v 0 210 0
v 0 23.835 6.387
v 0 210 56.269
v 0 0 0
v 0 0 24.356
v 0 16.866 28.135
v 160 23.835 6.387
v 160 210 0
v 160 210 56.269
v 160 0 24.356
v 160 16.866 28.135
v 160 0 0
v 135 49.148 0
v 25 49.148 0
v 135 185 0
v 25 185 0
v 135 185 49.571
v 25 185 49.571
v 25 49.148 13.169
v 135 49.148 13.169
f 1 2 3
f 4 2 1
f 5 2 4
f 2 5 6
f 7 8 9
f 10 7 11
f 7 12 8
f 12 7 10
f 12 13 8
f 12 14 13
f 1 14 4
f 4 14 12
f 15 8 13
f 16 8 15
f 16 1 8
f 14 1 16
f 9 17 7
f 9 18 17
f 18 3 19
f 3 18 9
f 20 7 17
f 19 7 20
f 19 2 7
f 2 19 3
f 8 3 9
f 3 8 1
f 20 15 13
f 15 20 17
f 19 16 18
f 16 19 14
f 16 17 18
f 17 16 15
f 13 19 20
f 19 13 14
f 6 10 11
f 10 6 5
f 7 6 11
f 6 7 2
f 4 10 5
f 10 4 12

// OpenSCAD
/** BODY PARAMS **/
l = 210;        // length in mm
w = 160;        // width in mm
a = 15;         // angle in degrees
h = tan(a) * l; // height in mm
t = 25;         // thickness in mm

/** REAR PARAMS **/
rw = w;  // width in mm
rl = 25; // length in mm
rh = h/2; // height in mm


/** BODY **/
difference(){
 hull(){
  polyhedron(//0       1       2       3       4       5       6
       points=[[0,0,0],[w,0,0],[w,l,0],[0,l,0],[w,0,0],[w,l,h],[0,l,h]],
       faces=[[0,1,2,3], [0,1,5,6], [2,3,5,6], [0,3,6], [1,2,5]]);
 }
 translate([t, t + (cos(a) * rl), -1]){
     cube([w - t - t, l - t - t - (cos(a) * rl), h + 2]);
 }
}

/** REAR **/
resize([0,0,rh]){
 difference(){
  rotate([a, 0, 0]) {
      cube([rw, rl, rh]);
  }
  translate([-1, -rh, -1]) {
      cube([rw + 2, rh, rh * 2 + 2]);
  }
 }
}
